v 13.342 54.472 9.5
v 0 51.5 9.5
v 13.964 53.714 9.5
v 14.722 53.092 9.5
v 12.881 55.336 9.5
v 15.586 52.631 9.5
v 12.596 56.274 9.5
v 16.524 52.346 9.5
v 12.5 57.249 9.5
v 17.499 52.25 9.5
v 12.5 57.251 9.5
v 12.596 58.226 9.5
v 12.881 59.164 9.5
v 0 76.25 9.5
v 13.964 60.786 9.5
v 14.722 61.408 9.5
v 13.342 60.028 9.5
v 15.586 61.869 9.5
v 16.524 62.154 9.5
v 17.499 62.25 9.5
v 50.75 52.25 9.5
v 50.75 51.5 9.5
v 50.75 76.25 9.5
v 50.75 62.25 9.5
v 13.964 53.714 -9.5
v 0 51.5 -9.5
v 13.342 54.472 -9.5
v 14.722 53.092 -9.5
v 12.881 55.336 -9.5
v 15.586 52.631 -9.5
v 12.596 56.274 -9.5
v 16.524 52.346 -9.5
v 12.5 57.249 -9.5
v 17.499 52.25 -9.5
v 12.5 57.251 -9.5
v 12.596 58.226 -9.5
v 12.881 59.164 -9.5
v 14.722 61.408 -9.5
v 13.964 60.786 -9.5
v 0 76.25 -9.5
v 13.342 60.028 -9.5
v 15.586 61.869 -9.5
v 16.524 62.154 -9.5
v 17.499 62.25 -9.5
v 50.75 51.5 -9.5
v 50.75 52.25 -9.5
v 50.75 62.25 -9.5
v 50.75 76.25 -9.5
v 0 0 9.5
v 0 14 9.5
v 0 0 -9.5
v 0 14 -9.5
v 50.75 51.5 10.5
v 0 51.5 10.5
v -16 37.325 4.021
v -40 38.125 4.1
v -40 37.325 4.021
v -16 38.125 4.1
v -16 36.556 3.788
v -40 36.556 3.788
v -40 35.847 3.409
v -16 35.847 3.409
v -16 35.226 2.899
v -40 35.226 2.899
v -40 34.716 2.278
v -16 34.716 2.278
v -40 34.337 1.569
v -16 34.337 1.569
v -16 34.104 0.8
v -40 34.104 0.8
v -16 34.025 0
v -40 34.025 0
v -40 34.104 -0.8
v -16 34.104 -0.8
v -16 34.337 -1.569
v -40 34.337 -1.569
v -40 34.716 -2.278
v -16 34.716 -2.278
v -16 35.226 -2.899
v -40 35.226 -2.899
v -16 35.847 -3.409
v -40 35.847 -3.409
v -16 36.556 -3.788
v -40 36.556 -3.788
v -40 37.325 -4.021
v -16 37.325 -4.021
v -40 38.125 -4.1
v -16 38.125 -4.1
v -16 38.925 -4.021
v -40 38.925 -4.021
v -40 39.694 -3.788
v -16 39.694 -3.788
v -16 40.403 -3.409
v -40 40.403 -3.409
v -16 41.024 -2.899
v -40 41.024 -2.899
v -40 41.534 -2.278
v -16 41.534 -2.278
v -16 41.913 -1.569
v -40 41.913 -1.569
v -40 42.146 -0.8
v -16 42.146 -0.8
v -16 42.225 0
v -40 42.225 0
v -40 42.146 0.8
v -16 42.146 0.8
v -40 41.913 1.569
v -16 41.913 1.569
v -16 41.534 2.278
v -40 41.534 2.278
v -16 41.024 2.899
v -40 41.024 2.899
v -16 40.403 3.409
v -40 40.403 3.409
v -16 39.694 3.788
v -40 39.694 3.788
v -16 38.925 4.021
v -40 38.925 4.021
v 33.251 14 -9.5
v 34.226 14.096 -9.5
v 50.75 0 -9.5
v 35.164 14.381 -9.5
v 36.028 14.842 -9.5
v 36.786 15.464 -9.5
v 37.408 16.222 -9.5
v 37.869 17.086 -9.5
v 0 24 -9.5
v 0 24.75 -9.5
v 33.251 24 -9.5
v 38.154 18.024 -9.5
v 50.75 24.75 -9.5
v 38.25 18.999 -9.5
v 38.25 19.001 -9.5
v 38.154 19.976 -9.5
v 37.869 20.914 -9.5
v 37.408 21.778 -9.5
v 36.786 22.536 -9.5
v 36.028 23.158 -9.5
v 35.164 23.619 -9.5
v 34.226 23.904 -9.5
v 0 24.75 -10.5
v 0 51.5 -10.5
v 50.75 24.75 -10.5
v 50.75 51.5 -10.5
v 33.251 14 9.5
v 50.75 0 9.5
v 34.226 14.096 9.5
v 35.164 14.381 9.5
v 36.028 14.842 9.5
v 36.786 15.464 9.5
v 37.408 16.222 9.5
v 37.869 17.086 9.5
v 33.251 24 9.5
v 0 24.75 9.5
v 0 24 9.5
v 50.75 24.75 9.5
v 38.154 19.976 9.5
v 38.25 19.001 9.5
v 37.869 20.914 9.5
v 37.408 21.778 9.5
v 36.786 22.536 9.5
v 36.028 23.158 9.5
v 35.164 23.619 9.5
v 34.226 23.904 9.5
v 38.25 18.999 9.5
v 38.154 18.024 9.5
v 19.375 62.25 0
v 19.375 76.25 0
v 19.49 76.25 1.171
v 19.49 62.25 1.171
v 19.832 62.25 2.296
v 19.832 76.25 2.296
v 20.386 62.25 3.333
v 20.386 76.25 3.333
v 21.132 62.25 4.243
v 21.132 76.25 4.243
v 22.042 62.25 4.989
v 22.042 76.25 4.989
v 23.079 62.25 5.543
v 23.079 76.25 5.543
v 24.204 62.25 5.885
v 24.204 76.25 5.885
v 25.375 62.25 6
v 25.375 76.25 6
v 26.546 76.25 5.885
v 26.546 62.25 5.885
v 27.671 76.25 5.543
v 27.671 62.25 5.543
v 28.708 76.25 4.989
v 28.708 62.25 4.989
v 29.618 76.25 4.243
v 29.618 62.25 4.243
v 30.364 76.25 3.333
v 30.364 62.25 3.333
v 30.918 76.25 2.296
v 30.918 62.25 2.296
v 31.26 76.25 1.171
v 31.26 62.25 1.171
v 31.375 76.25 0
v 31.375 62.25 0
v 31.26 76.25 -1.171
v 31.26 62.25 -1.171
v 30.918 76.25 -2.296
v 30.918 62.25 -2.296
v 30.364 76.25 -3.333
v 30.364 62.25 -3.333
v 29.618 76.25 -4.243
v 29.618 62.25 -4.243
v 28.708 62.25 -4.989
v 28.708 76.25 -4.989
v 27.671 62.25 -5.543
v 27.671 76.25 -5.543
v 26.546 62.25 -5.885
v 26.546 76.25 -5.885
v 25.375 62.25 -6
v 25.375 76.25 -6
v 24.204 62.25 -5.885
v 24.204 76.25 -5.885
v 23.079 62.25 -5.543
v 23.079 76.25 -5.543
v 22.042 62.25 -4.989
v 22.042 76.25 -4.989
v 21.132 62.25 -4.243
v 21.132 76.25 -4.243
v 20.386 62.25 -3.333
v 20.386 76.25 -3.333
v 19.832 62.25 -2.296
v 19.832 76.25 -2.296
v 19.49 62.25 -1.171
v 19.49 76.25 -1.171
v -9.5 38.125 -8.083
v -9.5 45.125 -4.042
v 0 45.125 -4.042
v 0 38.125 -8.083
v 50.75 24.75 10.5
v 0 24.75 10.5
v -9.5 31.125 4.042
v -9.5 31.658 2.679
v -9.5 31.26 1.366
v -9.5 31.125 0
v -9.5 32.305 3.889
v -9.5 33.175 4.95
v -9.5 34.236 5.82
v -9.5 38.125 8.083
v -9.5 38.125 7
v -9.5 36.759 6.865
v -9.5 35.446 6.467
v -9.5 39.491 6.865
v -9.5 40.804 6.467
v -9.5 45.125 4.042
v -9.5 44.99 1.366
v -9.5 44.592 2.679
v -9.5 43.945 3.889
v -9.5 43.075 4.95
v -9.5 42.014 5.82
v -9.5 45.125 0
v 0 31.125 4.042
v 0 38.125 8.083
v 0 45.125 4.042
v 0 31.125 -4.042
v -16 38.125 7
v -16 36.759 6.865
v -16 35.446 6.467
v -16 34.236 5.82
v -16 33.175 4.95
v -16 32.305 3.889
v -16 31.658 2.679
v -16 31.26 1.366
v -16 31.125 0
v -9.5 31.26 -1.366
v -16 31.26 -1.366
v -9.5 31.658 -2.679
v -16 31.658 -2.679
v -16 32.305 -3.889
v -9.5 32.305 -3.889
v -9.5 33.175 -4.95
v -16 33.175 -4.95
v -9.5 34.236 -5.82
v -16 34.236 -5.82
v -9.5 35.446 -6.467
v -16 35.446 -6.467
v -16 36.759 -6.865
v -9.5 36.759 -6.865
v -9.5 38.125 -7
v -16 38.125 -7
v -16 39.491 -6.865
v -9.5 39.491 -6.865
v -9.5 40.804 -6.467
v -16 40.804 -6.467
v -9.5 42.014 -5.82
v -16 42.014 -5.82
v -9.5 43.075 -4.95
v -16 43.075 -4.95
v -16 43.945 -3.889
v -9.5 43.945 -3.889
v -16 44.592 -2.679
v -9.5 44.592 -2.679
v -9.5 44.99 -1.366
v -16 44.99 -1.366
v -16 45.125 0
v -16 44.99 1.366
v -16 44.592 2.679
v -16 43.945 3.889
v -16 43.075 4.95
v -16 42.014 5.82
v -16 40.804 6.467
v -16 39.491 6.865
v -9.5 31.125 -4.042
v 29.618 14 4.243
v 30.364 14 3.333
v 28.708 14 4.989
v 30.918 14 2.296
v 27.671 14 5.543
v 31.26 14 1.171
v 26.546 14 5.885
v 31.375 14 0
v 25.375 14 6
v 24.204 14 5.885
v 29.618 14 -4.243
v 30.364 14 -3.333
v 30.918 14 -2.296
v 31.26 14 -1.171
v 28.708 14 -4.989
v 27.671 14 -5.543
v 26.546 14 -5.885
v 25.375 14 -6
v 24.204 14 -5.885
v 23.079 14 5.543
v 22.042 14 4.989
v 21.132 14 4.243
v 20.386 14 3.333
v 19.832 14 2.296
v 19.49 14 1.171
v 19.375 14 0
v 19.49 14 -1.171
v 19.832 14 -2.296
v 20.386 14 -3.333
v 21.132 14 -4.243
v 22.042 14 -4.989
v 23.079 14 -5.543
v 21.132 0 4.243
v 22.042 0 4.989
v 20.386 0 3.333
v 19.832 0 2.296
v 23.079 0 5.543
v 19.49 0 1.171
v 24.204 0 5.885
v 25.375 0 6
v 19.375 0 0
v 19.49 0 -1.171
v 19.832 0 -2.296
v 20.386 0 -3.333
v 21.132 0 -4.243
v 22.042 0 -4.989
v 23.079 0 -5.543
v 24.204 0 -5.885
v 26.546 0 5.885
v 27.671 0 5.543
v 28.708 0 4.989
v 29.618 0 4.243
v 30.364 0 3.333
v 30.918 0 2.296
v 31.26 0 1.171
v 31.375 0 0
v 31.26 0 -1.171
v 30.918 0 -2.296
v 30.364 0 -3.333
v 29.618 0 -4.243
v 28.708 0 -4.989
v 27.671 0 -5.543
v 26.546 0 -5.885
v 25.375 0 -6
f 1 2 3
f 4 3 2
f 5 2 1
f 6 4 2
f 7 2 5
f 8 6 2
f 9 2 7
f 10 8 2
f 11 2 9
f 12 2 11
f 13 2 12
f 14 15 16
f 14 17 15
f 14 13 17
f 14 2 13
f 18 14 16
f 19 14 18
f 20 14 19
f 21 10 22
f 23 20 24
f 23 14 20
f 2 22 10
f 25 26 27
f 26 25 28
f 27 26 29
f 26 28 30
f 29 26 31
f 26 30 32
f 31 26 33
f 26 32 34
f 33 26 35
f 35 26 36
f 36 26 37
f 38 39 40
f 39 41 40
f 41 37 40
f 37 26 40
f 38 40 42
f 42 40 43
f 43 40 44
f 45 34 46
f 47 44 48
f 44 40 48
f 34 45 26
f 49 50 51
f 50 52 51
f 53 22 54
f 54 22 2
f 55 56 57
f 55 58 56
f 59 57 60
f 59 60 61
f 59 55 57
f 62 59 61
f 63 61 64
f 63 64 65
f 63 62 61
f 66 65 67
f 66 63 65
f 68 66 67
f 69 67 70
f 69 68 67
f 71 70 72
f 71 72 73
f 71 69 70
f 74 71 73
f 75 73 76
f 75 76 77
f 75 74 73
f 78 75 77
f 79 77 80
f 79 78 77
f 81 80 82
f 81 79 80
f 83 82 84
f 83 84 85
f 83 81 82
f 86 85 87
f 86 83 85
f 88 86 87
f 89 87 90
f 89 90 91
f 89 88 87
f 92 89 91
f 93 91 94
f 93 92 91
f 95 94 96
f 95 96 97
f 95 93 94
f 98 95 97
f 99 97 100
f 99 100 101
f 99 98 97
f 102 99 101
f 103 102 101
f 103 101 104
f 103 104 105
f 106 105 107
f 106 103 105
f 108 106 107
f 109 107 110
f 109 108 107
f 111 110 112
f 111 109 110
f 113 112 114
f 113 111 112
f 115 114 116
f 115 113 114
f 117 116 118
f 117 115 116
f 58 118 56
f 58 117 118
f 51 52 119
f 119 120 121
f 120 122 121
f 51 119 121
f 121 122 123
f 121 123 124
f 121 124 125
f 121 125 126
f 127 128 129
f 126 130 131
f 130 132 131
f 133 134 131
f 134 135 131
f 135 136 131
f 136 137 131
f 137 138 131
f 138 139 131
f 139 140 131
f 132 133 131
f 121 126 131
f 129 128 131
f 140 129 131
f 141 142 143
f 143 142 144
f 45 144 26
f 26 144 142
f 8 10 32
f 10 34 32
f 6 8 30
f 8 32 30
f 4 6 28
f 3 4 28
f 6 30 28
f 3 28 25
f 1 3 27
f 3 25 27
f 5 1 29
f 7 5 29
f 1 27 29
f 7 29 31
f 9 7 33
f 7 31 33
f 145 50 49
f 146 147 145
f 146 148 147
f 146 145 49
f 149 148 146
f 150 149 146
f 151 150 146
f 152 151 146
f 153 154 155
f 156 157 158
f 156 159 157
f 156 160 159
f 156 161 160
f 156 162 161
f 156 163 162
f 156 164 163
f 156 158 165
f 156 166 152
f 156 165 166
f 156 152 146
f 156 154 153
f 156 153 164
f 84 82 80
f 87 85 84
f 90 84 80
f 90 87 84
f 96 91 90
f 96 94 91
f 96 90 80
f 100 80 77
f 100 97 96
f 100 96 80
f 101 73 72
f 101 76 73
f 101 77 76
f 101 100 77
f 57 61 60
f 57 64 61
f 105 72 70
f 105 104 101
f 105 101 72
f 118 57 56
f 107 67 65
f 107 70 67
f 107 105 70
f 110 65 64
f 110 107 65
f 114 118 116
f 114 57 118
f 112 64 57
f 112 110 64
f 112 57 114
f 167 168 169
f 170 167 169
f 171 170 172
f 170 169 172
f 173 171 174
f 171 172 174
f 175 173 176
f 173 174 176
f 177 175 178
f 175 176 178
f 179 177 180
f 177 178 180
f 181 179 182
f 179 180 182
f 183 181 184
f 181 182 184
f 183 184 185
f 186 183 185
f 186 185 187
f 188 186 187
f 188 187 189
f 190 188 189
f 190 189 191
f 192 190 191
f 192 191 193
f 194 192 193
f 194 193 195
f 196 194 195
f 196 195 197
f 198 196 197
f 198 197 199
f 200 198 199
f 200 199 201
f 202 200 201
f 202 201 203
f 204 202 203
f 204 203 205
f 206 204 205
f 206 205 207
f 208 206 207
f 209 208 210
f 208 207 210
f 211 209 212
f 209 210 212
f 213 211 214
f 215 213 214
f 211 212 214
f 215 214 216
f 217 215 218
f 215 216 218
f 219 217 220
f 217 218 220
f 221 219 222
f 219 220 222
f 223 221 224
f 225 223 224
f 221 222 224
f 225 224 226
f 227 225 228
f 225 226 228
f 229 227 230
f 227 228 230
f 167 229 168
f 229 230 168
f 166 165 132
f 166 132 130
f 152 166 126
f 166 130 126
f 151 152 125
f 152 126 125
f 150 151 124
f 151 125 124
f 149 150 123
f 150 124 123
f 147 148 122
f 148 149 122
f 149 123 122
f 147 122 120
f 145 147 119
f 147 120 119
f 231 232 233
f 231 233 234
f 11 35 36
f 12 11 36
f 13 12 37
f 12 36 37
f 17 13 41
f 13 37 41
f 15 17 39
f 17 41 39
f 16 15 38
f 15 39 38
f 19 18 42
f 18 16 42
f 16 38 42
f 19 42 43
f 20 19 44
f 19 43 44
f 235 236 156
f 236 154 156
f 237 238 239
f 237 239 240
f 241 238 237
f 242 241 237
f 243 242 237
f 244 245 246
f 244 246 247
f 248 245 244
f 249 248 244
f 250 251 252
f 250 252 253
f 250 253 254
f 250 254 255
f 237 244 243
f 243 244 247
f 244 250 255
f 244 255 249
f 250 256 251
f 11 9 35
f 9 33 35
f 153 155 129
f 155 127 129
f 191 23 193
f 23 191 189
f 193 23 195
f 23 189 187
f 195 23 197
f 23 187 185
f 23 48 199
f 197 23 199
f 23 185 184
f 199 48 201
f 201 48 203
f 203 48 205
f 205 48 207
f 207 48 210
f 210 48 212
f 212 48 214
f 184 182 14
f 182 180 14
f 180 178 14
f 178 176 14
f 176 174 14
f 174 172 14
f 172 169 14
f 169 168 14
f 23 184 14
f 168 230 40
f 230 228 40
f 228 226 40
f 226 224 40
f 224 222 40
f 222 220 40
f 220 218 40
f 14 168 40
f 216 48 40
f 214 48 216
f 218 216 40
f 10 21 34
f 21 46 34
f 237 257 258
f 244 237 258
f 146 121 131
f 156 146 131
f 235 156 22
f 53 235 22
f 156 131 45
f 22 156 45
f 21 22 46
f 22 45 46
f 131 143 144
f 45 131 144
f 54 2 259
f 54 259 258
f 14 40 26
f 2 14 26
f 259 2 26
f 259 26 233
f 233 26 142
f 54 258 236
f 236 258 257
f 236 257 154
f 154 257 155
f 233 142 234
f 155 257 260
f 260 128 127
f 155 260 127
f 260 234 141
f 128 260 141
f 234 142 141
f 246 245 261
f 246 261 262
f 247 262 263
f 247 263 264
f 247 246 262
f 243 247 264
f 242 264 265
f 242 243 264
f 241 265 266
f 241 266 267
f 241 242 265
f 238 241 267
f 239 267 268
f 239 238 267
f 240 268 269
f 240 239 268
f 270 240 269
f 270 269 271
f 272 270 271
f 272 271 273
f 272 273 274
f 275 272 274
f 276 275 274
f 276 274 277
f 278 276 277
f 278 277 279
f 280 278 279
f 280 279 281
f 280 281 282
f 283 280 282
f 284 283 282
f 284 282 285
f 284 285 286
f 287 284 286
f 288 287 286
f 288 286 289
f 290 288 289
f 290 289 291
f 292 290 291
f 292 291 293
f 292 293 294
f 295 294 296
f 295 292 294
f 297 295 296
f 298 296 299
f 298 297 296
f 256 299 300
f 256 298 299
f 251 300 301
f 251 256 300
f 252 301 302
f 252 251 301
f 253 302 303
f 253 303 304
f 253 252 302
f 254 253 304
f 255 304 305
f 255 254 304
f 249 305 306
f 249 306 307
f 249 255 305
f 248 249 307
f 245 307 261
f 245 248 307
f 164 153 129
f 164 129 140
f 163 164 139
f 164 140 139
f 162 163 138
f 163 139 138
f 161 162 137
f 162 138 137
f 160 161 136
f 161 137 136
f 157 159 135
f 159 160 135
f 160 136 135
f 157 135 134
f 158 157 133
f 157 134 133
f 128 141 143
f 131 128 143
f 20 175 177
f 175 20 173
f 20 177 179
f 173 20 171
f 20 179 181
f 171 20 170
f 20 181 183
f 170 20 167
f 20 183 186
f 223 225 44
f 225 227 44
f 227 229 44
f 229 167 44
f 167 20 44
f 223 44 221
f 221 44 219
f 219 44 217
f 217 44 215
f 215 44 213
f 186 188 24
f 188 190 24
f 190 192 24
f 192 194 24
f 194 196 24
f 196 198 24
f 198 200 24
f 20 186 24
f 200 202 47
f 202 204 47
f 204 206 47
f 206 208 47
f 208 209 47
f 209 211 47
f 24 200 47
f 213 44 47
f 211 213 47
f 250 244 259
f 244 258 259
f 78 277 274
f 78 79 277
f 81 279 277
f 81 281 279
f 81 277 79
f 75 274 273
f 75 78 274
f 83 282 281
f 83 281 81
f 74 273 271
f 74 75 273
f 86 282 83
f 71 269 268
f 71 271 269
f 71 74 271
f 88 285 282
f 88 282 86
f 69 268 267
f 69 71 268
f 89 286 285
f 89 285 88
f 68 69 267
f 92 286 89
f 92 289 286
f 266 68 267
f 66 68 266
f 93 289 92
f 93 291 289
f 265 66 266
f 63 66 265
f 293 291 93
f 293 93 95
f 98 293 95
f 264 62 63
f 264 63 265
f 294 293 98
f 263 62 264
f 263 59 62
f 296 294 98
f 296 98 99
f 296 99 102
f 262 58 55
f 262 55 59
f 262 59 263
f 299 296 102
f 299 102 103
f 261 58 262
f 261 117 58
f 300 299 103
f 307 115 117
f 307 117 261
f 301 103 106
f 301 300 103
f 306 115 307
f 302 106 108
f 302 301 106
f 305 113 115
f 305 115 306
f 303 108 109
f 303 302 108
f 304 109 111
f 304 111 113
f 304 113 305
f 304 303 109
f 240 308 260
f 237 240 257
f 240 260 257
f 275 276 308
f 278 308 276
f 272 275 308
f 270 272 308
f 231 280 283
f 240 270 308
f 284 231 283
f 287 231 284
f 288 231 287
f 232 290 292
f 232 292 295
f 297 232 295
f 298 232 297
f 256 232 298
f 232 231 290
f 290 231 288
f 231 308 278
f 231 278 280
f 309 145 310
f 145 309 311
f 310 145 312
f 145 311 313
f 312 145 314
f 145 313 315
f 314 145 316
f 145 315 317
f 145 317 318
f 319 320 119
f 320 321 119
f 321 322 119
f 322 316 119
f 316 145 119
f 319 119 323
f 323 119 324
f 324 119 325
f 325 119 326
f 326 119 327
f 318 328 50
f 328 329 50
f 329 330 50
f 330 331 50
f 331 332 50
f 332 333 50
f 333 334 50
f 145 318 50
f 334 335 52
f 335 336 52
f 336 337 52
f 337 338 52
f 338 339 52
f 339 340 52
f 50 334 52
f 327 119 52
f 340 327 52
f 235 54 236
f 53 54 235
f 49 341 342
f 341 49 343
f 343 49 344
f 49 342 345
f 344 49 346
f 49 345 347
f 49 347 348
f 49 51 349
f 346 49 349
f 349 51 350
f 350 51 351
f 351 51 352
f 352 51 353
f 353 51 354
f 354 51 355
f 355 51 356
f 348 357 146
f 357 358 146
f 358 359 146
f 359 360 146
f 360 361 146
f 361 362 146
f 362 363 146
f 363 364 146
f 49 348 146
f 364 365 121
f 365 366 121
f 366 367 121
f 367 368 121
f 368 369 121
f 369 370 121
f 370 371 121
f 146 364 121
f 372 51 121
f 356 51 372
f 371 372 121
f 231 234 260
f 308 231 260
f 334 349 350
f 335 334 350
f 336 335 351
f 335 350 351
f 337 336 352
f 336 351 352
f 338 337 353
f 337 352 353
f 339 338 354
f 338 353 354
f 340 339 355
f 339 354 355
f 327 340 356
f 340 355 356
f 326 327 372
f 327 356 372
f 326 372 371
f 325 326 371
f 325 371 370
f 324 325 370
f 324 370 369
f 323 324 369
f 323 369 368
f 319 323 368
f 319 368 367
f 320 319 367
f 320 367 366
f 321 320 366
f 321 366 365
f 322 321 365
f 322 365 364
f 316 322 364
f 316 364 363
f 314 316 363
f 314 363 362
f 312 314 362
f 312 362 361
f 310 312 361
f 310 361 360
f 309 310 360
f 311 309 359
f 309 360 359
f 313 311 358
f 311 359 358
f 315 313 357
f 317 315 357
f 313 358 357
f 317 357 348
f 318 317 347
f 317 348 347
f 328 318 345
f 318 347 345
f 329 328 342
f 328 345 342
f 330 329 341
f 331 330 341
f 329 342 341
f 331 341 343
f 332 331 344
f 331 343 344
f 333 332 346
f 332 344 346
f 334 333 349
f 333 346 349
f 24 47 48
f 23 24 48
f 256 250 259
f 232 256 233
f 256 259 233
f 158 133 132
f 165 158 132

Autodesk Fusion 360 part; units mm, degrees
sketch "Sketch1" plane through (0, 0, 0) normal (0, 0, 1) x (1, 0, 0)
  line L0 (0, 0) -> (50.75, 0)
  line L1 (50.75, 0) -> (50.75, 52.25)
  line L2 (50.75, 52.25) -> (12.5, 52.25)
  line L3 (12.5, 52.25) -> (12.5, 62.25)
  line L4 (12.5, 62.25) -> (50.75, 62.25)
  line L5 (50.75, 62.25) -> (50.75, 76.25)
  line L6 (50.75, 76.25) -> (0, 76.25)
  line L7 (0, 76.25) -> (0, 24)
  line L8 (0, 24) -> (38.25, 24)
  line L9 (38.25, 24) -> (38.25, 14)
  line L10 (38.25, 14) -> (0, 14)
  line L11 (0, 14) -> (0, 0)
  line L12 (0, 24.75) -> (50.75, 24.75)
  line L13 (50.75, 51.5) -> (0, 51.5)
  dimension "d1" = 76.25
  dimension "d2" = 14
  dimension "d3" = 10
  dimension "d4" = 50.75
  dimension "d5" = 12.5
  dimension "d6" = 0.75
  dimension "d7" = 0.75
extrude "Extrude1" add sketch "Sketch1" along normal mid plane 19
extrude "Extrude2" add sketch "Sketch1" along normal mid plane 21 contours L1 L7 L12 L13
sketch "Sketch2" plane through (0, 0, 0) normal (-1, 0, 0) x (0, 0, 1)
  line L0 (9.5, 51.5) -> (9.5, 76.25)
  line L1 (9.5, 76.25) -> (-9.5, 76.25)
  line L2 (-9.5, 76.25) -> (-9.5, 51.5)
  line L3 (-9.5, 51.5) -> (-10.5, 51.5)
  line L4 (-10.5, 51.5) -> (-10.5, 24.75)
  line L5 (-10.5, 24.75) -> (-9.5, 24.75)
  line L6 (-9.5, 24.75) -> (-9.5, 24)
  line L7 (-9.5, 24) -> (9.5, 24)
  line L8 (9.5, 24) -> (9.5, 24.75)
  line L9 (9.5, 24.75) -> (10.5, 24.75)
  line L10 (10.5, 24.75) -> (10.5, 51.5)
  line L11 (10.5, 51.5) -> (9.5, 51.5)
  line L12 (8.0829, 38.125) -> (4.0415, 45.125)
  line L13 (4.0415, 45.125) -> (-4.0415, 45.125)
  line L14 (-4.0415, 45.125) -> (-8.0829, 38.125)
  line L15 (-8.0829, 38.125) -> (-4.0415, 31.125)
  line L16 (-4.0415, 31.125) -> (4.0415, 31.125)
  line L17 (4.0415, 31.125) -> (8.0829, 38.125)
  line L18 (-9.5, 0) -> (9.5, 0)
  line L19 (0, 76.25) -> (0, 24)
  circle A0 centre (0, 38.125) radius 4.1
  circle A1 centre (0, 38.125) radius 7
  point P0 (0, 38.125)
  dimension "d12" = 7
  dimension "d13" = 38.125
  dimension "d14" = 8.2
  dimension "d15" = 14
extrude "Extrude3" add sketch "Sketch2" along normal blind 9.5 contours L13 L14 A1 | L19 A0 A1 | L12 L13 A1 | L19 A0 A1 | L19 A0 | L19 A0 | L12 L17 A1 | L14 L15 A1 | L15 L16 A1 | L16 L17 A1
extrude "Extrude4" add sketch "Sketch2" along normal blind 16 contours L19 A0 A1 | L19 A0 A1 | L19 A0 | L19 A0
extrude "Extrude5" add sketch "Sketch2" along normal blind 40 contours L19 A0 | L19 A0
fillet "Fillet1" radius 5 4 edges at (38.25, 14, 0) (38.25, 24, 0) (12.5, 62.25, 0) (12.5, 52.25, 0)
sketch "Sketch3" plane through (0, 76.25, 0) normal (0, 1, 0) x (-1, 0, 0)
  line L0 (0, -9.5) -> (0, 9.5)
  line L1 (0, 9.5) -> (-50.75, 9.5)
  line L2 (-50.75, 9.5) -> (-50.75, -9.5)
  line L3 (-50.75, -9.5) -> (0, -9.5)
  circle A0 centre (-25.375, 0) radius 6
  line L4 (0, 4.0415) -> (0, -4.0415)
  line L5 (-50.75, 0) -> (0, 0)
  dimension "d24" = 25.375
  dimension "d25" = 12
extrude "Extrude6" cut sketch "Sketch3" against normal up to surface (14 mm away) contours A0 L5 | A0 L5
extrude "Extrude7" cut sketch "Sketch3" along normal up to surface (14 mm away) from surface at -76.25 contours A0 L5 | A0 L5
thread "Thread1"
thread "Thread2"
equation "d8 = ( 19 / 2 ) * 1 mm"
equation "d10 = ( 21 / 2 ) * 1 mm"
equation "d12 = ( 14 / 2 ) * 1 mm"
equation "d13 = d1 / 2"
equation "d24 = d4 / 2"
